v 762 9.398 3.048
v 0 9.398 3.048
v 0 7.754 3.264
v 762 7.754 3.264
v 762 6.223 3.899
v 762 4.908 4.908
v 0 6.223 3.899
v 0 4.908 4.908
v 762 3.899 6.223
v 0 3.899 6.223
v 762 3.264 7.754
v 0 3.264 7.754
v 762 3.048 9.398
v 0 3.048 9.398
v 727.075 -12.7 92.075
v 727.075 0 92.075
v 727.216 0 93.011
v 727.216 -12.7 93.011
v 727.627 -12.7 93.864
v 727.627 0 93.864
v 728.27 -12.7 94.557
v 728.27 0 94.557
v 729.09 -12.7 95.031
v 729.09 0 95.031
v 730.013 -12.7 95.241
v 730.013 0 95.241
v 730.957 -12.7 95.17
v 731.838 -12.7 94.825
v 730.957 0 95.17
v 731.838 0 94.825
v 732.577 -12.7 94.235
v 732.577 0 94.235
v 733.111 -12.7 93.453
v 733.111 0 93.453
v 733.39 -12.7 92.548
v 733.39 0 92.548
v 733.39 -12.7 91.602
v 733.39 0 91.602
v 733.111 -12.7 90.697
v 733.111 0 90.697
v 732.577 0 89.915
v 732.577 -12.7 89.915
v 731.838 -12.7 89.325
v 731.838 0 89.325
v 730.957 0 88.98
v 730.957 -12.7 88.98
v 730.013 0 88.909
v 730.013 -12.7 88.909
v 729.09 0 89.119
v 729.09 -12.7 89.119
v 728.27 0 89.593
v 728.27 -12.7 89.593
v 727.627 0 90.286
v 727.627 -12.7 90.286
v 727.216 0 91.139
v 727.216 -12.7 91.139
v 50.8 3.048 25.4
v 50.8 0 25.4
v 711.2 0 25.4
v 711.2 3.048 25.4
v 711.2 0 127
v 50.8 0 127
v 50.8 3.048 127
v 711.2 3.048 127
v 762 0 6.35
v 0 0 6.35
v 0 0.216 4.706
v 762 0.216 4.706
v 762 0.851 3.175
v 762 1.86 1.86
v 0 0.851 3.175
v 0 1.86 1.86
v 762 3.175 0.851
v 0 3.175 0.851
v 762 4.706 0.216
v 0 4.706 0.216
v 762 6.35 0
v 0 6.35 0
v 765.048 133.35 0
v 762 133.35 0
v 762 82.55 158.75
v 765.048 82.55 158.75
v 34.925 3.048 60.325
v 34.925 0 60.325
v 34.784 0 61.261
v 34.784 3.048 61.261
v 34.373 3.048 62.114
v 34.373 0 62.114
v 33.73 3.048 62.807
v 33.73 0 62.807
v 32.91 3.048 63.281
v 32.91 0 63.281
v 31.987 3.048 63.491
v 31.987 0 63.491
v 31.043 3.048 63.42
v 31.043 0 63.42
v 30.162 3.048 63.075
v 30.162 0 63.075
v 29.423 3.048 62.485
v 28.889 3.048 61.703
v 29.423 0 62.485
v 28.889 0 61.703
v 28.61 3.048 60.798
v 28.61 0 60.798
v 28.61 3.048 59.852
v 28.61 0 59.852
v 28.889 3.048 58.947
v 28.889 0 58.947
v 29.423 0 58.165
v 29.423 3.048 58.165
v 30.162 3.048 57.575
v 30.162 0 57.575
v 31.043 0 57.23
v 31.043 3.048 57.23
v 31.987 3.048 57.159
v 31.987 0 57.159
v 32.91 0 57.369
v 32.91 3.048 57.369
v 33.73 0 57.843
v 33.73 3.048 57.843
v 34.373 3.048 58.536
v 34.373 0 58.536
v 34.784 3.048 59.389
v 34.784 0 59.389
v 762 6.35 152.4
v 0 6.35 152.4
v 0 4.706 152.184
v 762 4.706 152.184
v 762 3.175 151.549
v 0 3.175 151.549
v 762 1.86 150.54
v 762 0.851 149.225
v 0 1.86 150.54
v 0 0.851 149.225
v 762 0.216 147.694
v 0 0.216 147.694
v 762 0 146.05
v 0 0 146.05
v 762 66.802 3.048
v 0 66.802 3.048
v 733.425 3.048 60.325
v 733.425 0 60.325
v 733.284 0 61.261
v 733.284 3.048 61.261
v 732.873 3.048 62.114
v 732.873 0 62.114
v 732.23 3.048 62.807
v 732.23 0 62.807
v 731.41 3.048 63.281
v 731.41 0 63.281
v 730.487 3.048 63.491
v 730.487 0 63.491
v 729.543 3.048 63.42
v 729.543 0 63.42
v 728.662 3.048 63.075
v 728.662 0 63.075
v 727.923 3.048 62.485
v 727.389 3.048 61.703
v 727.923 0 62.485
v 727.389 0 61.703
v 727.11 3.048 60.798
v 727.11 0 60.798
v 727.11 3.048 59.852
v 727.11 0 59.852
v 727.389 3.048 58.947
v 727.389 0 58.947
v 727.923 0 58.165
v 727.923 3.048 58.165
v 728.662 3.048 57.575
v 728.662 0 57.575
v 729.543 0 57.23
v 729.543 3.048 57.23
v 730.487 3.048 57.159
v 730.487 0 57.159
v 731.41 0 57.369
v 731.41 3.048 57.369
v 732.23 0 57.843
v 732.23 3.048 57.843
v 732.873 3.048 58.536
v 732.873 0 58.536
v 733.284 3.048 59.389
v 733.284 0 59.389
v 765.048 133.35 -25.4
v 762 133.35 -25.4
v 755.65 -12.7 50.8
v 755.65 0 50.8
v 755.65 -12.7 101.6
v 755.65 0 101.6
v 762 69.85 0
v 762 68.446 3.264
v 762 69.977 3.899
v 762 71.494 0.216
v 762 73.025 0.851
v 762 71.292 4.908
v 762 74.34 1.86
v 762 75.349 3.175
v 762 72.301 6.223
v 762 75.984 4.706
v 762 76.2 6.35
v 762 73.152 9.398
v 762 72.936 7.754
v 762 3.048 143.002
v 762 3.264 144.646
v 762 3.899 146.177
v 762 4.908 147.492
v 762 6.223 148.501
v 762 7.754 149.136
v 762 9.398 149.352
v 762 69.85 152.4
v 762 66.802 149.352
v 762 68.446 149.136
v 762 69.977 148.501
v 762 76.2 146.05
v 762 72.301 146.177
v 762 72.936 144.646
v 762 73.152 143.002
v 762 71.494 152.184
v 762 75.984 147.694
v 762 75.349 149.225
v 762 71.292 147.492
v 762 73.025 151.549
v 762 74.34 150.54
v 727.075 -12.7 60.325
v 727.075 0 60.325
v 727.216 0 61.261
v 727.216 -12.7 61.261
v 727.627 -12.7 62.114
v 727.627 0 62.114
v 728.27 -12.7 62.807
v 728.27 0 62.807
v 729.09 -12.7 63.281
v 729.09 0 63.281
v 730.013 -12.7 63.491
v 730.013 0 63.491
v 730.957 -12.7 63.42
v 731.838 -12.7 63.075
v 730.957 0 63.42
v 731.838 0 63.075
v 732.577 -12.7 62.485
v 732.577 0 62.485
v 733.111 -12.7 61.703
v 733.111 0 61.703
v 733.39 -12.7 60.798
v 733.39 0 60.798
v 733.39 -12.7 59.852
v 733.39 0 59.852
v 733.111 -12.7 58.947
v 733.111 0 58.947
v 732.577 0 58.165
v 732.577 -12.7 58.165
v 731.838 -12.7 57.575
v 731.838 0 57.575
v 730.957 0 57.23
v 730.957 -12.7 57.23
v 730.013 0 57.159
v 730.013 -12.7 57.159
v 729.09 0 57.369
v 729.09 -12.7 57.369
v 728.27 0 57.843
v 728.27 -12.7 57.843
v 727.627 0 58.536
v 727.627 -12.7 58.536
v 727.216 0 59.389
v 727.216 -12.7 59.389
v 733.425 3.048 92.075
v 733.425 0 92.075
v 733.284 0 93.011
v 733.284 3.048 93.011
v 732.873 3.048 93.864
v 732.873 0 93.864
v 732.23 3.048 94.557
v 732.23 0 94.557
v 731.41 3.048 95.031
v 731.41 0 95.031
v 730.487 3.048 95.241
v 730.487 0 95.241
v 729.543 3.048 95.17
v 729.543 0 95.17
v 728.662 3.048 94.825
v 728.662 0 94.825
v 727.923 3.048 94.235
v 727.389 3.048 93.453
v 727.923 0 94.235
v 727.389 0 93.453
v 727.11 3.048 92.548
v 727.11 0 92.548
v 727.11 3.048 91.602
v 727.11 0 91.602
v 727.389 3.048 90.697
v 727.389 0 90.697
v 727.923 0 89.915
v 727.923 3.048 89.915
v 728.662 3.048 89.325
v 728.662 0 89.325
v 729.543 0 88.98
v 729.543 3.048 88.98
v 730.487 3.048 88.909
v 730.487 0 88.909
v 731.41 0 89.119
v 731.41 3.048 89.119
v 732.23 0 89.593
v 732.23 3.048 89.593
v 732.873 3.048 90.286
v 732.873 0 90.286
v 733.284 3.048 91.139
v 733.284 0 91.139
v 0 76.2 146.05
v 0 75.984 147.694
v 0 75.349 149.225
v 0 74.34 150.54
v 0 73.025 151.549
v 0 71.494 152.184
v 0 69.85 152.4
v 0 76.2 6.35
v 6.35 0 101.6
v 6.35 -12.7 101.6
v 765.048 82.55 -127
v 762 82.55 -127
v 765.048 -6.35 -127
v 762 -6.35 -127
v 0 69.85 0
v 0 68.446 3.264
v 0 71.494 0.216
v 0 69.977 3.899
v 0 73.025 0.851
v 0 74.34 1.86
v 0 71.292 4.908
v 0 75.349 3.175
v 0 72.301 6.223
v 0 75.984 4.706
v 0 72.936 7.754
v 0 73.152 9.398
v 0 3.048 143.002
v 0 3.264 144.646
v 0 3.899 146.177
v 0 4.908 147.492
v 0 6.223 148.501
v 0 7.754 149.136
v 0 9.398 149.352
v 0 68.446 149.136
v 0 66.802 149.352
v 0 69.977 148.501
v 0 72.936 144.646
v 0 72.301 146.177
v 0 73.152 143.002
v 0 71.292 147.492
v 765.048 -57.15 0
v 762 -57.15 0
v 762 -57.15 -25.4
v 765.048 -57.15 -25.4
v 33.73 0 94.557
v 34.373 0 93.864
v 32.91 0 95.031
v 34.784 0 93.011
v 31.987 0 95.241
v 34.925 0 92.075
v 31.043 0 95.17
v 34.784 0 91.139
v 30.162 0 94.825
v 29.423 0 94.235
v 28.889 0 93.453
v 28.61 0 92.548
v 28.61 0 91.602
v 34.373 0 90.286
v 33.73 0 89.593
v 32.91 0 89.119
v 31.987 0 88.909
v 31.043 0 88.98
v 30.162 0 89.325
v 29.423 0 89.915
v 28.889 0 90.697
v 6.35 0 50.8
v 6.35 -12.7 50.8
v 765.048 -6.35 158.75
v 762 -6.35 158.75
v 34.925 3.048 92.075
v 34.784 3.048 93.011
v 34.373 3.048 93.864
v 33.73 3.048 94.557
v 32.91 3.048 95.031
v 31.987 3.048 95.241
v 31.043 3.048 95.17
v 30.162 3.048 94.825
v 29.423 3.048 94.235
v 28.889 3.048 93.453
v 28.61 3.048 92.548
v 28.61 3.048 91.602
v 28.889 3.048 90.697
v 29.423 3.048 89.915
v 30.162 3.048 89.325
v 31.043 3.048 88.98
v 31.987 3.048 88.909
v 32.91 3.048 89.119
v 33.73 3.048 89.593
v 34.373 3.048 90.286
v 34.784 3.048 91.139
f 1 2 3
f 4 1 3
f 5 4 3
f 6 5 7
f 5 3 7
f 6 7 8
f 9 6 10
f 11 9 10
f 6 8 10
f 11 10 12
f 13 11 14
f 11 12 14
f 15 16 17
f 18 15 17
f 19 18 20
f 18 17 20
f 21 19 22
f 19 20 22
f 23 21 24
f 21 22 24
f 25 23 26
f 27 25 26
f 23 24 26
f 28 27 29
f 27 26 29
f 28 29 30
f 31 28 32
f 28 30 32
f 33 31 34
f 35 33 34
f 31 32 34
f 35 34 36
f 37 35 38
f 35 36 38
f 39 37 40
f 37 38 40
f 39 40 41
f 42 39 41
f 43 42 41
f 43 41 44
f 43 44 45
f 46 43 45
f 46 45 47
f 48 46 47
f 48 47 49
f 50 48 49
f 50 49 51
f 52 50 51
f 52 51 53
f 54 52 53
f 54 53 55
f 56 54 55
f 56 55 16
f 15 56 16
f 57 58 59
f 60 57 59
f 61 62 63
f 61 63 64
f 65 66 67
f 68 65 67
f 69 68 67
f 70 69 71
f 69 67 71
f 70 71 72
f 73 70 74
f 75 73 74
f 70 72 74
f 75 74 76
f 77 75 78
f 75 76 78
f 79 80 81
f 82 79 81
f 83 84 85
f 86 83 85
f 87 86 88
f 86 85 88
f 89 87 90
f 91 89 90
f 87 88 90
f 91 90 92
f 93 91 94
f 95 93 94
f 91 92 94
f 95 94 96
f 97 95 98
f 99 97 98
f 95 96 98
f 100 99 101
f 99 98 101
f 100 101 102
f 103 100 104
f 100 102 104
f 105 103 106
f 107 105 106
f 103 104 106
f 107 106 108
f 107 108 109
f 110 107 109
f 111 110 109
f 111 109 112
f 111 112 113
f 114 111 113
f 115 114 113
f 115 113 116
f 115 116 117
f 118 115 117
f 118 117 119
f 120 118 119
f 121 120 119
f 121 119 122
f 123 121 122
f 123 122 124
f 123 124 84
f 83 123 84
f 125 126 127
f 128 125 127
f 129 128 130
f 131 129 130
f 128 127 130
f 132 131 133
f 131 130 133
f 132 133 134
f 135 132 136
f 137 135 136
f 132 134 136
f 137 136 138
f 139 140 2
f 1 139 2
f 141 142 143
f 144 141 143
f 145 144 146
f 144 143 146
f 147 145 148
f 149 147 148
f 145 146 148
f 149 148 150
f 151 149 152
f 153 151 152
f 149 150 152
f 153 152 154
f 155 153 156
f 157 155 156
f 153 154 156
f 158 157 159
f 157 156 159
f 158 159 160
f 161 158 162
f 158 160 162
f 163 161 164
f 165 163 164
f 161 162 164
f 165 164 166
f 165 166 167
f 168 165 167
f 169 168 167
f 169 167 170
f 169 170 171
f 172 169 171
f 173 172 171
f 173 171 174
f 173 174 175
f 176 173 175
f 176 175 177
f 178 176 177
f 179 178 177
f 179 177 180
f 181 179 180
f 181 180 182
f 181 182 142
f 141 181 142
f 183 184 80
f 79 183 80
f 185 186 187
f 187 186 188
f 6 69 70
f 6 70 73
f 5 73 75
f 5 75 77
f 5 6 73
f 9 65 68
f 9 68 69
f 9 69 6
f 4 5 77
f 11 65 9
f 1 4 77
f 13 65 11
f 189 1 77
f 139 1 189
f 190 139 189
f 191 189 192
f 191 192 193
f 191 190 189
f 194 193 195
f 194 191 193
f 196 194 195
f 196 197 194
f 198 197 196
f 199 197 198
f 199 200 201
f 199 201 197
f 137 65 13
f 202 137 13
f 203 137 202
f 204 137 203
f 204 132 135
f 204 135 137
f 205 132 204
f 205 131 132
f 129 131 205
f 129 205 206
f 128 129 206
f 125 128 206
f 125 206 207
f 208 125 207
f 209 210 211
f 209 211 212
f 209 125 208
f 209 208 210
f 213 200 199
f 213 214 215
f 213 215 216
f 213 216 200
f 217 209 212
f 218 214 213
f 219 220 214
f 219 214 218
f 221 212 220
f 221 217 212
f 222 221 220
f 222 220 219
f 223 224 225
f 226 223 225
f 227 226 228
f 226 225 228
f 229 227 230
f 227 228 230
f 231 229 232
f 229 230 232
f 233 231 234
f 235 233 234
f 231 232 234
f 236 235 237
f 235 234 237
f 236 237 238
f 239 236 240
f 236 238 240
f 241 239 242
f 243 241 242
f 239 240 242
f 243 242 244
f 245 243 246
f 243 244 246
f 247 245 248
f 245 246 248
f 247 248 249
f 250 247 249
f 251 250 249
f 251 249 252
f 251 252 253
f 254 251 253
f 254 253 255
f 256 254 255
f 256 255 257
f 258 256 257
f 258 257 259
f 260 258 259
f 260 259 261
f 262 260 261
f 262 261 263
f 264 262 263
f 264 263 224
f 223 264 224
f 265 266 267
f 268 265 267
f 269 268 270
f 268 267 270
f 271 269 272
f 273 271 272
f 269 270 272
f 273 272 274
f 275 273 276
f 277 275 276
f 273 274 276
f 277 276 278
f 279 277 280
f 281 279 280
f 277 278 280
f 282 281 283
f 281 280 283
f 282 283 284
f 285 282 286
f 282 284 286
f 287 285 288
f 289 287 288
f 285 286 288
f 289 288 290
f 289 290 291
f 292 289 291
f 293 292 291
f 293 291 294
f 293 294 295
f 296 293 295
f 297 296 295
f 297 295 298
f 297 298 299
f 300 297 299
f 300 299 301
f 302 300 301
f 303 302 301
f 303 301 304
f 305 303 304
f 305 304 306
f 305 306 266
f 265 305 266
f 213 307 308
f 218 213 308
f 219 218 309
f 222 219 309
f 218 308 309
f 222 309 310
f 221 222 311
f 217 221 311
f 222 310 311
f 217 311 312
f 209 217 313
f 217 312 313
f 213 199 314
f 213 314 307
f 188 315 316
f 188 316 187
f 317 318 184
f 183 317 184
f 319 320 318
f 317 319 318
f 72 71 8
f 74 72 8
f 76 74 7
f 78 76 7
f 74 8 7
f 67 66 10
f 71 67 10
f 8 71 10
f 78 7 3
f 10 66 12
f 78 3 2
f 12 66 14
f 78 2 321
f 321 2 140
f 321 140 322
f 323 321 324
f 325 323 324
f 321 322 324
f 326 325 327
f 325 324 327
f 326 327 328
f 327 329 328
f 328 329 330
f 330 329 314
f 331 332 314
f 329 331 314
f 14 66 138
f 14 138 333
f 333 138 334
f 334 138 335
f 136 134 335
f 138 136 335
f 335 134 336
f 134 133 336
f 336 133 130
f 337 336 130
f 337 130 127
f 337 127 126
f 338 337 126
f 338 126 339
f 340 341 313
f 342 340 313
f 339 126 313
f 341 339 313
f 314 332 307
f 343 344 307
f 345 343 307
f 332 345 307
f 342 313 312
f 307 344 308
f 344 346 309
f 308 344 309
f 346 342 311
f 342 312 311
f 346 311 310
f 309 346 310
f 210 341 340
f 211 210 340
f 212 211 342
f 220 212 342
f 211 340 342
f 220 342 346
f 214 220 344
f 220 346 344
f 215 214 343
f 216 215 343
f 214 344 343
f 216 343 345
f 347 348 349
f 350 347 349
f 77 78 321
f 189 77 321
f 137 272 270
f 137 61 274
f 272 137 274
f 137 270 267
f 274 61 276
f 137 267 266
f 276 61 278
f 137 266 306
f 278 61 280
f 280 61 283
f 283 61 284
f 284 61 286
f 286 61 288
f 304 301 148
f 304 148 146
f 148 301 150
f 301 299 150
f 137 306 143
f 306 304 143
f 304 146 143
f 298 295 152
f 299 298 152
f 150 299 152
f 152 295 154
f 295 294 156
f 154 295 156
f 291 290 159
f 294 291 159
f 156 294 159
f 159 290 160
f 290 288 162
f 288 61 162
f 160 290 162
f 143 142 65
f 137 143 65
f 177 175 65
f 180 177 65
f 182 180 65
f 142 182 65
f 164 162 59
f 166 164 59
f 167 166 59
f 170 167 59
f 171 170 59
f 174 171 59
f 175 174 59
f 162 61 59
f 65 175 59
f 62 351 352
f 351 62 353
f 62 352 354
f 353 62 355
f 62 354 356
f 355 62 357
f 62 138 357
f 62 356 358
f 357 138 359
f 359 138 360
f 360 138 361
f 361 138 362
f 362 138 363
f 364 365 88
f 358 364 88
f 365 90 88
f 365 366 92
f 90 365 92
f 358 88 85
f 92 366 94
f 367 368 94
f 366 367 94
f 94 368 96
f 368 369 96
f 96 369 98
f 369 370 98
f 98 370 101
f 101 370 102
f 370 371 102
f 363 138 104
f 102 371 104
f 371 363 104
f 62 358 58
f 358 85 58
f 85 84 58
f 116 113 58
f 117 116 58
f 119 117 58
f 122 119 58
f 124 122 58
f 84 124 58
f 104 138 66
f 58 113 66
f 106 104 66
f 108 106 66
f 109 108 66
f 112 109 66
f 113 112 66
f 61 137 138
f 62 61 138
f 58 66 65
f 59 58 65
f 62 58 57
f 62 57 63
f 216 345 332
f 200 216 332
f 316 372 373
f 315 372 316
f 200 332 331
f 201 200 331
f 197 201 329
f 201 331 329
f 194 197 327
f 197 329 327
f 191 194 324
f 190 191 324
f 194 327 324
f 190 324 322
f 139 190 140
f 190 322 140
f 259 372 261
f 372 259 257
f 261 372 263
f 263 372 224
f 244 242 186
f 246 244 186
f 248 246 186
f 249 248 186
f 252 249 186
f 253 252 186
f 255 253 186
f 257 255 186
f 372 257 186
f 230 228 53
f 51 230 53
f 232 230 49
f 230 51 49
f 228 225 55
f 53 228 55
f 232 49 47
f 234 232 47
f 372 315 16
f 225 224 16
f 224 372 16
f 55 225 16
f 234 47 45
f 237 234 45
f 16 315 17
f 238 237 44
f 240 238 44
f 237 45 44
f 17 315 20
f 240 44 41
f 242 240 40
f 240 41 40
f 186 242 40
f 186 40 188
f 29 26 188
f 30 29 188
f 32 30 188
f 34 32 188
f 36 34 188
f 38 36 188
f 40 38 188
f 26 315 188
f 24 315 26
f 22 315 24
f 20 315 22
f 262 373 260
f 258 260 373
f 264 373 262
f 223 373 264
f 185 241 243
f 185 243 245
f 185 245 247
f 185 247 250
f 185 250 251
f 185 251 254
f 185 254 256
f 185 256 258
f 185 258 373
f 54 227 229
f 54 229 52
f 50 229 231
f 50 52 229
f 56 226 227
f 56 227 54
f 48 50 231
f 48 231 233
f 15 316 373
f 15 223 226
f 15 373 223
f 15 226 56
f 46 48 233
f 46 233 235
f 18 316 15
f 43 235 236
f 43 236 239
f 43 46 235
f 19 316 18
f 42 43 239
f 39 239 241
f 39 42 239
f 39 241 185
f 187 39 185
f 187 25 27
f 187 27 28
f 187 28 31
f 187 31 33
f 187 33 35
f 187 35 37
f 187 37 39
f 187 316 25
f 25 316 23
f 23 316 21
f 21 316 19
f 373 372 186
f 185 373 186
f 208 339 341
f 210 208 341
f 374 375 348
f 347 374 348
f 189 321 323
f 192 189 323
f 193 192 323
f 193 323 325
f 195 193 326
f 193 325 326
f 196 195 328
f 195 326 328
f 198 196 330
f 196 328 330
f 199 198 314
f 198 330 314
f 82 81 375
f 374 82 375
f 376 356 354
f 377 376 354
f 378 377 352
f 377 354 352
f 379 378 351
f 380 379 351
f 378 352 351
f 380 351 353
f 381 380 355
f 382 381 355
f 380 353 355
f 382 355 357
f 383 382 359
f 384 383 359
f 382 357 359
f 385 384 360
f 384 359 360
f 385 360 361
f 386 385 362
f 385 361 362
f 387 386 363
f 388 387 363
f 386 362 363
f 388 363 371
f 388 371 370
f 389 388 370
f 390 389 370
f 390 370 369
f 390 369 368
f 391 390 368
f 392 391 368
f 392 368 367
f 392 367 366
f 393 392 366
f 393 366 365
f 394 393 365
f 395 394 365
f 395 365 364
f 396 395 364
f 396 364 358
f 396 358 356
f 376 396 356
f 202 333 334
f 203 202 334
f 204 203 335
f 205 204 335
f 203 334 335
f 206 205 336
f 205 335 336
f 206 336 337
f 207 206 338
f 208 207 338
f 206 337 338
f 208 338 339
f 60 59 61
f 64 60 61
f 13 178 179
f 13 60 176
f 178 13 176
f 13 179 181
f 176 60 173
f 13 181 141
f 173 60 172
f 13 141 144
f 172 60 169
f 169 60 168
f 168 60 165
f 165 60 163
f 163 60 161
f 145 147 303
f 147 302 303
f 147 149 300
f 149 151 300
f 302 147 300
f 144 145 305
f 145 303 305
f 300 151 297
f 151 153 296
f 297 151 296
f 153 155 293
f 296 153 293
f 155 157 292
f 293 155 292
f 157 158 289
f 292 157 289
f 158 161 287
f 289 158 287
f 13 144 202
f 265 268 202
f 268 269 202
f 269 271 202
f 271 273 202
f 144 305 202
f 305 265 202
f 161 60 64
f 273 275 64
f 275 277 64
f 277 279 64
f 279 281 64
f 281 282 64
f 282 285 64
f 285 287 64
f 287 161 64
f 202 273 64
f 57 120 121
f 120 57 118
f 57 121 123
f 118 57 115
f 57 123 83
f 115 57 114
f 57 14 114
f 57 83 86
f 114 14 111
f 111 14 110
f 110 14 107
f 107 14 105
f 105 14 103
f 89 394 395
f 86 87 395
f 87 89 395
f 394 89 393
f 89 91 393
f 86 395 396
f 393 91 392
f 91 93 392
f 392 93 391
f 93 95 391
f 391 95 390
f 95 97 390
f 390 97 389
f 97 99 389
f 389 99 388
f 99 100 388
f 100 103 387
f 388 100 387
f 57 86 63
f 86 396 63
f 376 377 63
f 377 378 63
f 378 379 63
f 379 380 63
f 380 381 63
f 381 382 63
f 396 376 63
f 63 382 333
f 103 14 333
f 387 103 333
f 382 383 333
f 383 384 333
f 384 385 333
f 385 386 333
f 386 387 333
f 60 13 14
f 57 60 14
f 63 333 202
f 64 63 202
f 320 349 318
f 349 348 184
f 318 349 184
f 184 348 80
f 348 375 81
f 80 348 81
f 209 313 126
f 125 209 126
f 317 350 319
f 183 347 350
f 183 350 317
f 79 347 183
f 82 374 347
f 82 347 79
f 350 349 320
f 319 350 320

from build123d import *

# Parameters (mm, degrees)
F1_DEPTH  = 762
F2_W      = 660.4
F2_H      = 101.6
F3_DEPTH  = 3.048
F4_R      = 3.175
F5_DEPTH  = 25.4
F6_W      = 749.3
F6_H      = 50.8
F7_DEPTH  = 12.7
F8_R      = 3.175
F9_DEPTH  = 15.749
F11_DEPTH = 3.048


with BuildPart() as f1:
    # F0 (on Right) → F1 (new body)
    with BuildSketch(Plane.YZ):
        with BuildLine():
            ThreePointArc((0, 6.35), (1.8598719395, 1.8598719395), (6.35, 0))
            Line((6.35, 0), (69.85, 0))
            ThreePointArc((69.85, 0), (74.3401280605, 1.8598719395), (76.2, 6.35))
            Line((76.2, 6.35), (76.2, 146.05))
            ThreePointArc((76.2, 146.05), (74.3401280605, 150.5401280605), (69.85, 152.4))
            Line((69.85, 152.4), (6.35, 152.4))
            ThreePointArc((6.35, 152.4), (1.8598719395, 150.5401280605), (0, 146.05))
            Line((0, 146.05), (0, 6.35))
        make_face()
        with BuildLine():
            Line((73.152, 143.002), (73.152, 9.398))
            ThreePointArc((73.152, 9.398), (71.2921280605, 4.9078719395), (66.802, 3.048))
            Line((66.802, 3.048), (9.398, 3.048))
            ThreePointArc((9.398, 3.048), (4.9078719395, 4.9078719395), (3.048, 9.398))
            Line((3.048, 9.398), (3.048, 143.002))
            ThreePointArc((3.048, 143.002), (4.9078719395, 147.4921280605), (9.398, 149.352))
            Line((9.398, 149.352), (66.802, 149.352))
            ThreePointArc((66.802, 149.352), (71.2921280605, 147.4921280605), (73.152, 143.002))
        make_face(mode=Mode.SUBTRACT)
    extrude(amount=F1_DEPTH)

    # F2 (on face) → F3 (cut)
    with BuildSketch(Plane.XZ):
        with Locations((381, 76.2)):
            Rectangle(F2_W, F2_H)
    extrude(amount=-F3_DEPTH, mode=Mode.SUBTRACT)

    # F4 (on face) → F5 (cut)
    with BuildSketch(Plane.XZ):
        with Locations((730.25, 92.075)):
            Circle(F4_R)
        with Locations((730.25, 60.325)):
            Circle(F4_R)
        with Locations((31.75, 60.325)):
            Circle(F4_R)
        with Locations((31.75, 92.075)):
            Circle(F4_R)
    extrude(amount=-F5_DEPTH, mode=Mode.SUBTRACT)


with BuildPart() as f7:
    # F6 (on face) → F7 (new body)
    with BuildSketch(Plane.XZ):
        with Locations((381, 76.2)):
            Rectangle(F6_W, F6_H)
    extrude(amount=F7_DEPTH)

    # F8 (on face) → F9 (cut, through all)
    with BuildSketch(Plane(origin=(0, 3.048, 0), x_dir=(-1, 0, 0), z_dir=(0, 1, 0))):
        with Locations((-730.25, 60.325)):
            Circle(F8_R)
        with Locations((-730.25, 92.075)):
            Circle(F8_R)
    extrude(amount=-F9_DEPTH, mode=Mode.SUBTRACT)


with BuildPart() as f11:
    # F10 (on face) → F11 (new body)
    with BuildSketch(Plane.YZ.offset(762)):
        Polygon((82.55, 158.75), (-6.35, 158.75), (-57.15, 0), (-57.15, -25.4), (-6.35, -127), (82.55, -127), (133.35, -25.4), (133.35, 0), align=None)
        with BuildLine():
            Line((0, 6.35), (0, 146.05))
            ThreePointArc((0, 146.05), (1.8598719395, 150.5401280605), (6.35, 152.4))
            Line((6.35, 152.4), (69.85, 152.4))
            ThreePointArc((69.85, 152.4), (74.3401280605, 150.5401280605), (76.2, 146.05))
            Line((76.2, 146.05), (76.2, 6.35))
            ThreePointArc((76.2, 6.35), (74.3401280605, 1.8598719395), (69.85, 0))
            Line((69.85, 0), (6.35, 0))
            ThreePointArc((6.35, 0), (1.8598719395, 1.8598719395), (0, 6.35))
        make_face(mode=Mode.SUBTRACT)
        with BuildLine():
            ThreePointArc((6.35, 152.4), (1.8598719395, 150.5401280605), (0, 146.05))
            Line((0, 146.05), (0, 6.35))
            ThreePointArc((0, 6.35), (1.8598719395, 1.8598719395), (6.35, 0))
            Line((6.35, 0), (69.85, 0))
            ThreePointArc((69.85, 0), (74.3401280605, 1.8598719395), (76.2, 6.35))
            Line((76.2, 6.35), (76.2, 146.05))
            ThreePointArc((76.2, 146.05), (74.3401280605, 150.5401280605), (69.85, 152.4))
            Line((69.85, 152.4), (6.35, 152.4))
        make_face()
        with BuildLine():
            ThreePointArc((66.802, 149.352), (71.2921280605, 147.4921280605), (73.152, 143.002))
            Line((73.152, 143.002), (73.152, 9.398))
            ThreePointArc((73.152, 9.398), (71.2921280605, 4.9078719395), (66.802, 3.048))
            Line((66.802, 3.048), (9.398, 3.048))
            ThreePointArc((9.398, 3.048), (4.9078719395, 4.9078719395), (3.048, 9.398))
            Line((3.048, 9.398), (3.048, 143.002))
            ThreePointArc((3.048, 143.002), (4.9078719395, 147.4921280605), (9.398, 149.352))
            Line((9.398, 149.352), (66.802, 149.352))
        make_face(mode=Mode.SUBTRACT)
        with BuildLine():
            Line((73.152, 9.398), (73.152, 143.002))
            ThreePointArc((73.152, 143.002), (71.2921280605, 147.4921280605), (66.802, 149.352))
            Line((66.802, 149.352), (9.398, 149.352))
            ThreePointArc((9.398, 149.352), (4.9078719395, 147.4921280605), (3.048, 143.002))
            Line((3.048, 143.002), (3.048, 9.398))
            ThreePointArc((3.048, 9.398), (4.9078719395, 4.9078719395), (9.398, 3.048))
            Line((9.398, 3.048), (66.802, 3.048))
            ThreePointArc((66.802, 3.048), (71.2921280605, 4.9078719395), (73.152, 9.398))
        make_face()
    extrude(amount=F11_DEPTH)


solid = Compound([f1.part, f7.part, f11.part])
